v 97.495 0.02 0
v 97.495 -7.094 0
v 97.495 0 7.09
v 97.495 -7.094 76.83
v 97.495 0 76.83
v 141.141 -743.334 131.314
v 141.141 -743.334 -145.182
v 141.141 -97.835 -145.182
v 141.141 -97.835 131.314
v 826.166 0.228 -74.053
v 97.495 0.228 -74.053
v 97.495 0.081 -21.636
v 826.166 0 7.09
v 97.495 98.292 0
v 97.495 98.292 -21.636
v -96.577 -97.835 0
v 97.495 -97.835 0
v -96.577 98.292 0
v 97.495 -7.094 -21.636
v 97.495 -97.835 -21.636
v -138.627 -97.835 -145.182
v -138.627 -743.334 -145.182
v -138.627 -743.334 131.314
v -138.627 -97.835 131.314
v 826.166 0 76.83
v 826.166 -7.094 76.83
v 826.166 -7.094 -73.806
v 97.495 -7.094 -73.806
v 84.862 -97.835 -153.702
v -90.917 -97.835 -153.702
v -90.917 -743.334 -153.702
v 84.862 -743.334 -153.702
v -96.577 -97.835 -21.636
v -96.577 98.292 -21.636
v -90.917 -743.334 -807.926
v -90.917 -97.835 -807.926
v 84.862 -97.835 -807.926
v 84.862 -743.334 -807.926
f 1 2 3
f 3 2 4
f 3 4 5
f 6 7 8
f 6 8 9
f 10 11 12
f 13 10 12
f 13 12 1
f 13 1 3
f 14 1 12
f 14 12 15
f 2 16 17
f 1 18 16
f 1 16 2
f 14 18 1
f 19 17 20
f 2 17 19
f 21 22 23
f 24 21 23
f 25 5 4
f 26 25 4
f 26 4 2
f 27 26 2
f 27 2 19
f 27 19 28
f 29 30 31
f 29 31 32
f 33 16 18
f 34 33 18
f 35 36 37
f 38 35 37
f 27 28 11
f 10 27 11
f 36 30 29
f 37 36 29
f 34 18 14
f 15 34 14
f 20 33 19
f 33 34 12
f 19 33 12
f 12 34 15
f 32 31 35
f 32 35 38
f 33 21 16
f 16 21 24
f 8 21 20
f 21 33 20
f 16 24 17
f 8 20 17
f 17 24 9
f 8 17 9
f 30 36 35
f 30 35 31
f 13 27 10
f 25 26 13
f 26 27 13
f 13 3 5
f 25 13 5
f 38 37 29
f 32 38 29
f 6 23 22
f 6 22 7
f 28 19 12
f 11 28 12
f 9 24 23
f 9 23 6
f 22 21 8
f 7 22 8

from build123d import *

# Parameters (mm, degrees)
F0_W     = 194.072149
F0_H     = 196.127132
F1_DEPTH = 21.636344
F3_DEPTH = 728.671312
F4_W     = 175.778807
F4_H     = 654.224575
F4_W_2   = 279.768556
F4_H_2   = 276.49638
F5_DEPTH = 645.498991


with BuildPart() as f1:
    # F0 (on Top) → F1 (new body)
    with BuildSketch(Plane.XY):
        with Locations((0.458945, 0.228219)):
            Rectangle(F0_W, F0_H)
    extrude(amount=-F1_DEPTH)

    # F2 (on face) → F3 (join)
    with BuildSketch(Plane.YZ.offset(97.495019)):
        Polygon((-7.093509, -73.806271), (0, 7.090414), (0, 76.829582), (-7.093509, 76.829582), (-7.093509, 0), align=None)
        Polygon((0.228219, -74.053243), (0, 7.090414), (-7.093509, -73.806271), align=None)
    extrude(amount=F3_DEPTH)

    # F4 (on face) → F5 (join)
    with BuildSketch(Plane.XZ.offset(97.835347)):
        with Locations((-3.027313, -480.814069)):
            Rectangle(F4_W, F4_H)
        with Locations((1.256913, -6.934181)):
            Rectangle(F4_W_2, F4_H_2)
    extrude(amount=F5_DEPTH)


solid = f1.part
